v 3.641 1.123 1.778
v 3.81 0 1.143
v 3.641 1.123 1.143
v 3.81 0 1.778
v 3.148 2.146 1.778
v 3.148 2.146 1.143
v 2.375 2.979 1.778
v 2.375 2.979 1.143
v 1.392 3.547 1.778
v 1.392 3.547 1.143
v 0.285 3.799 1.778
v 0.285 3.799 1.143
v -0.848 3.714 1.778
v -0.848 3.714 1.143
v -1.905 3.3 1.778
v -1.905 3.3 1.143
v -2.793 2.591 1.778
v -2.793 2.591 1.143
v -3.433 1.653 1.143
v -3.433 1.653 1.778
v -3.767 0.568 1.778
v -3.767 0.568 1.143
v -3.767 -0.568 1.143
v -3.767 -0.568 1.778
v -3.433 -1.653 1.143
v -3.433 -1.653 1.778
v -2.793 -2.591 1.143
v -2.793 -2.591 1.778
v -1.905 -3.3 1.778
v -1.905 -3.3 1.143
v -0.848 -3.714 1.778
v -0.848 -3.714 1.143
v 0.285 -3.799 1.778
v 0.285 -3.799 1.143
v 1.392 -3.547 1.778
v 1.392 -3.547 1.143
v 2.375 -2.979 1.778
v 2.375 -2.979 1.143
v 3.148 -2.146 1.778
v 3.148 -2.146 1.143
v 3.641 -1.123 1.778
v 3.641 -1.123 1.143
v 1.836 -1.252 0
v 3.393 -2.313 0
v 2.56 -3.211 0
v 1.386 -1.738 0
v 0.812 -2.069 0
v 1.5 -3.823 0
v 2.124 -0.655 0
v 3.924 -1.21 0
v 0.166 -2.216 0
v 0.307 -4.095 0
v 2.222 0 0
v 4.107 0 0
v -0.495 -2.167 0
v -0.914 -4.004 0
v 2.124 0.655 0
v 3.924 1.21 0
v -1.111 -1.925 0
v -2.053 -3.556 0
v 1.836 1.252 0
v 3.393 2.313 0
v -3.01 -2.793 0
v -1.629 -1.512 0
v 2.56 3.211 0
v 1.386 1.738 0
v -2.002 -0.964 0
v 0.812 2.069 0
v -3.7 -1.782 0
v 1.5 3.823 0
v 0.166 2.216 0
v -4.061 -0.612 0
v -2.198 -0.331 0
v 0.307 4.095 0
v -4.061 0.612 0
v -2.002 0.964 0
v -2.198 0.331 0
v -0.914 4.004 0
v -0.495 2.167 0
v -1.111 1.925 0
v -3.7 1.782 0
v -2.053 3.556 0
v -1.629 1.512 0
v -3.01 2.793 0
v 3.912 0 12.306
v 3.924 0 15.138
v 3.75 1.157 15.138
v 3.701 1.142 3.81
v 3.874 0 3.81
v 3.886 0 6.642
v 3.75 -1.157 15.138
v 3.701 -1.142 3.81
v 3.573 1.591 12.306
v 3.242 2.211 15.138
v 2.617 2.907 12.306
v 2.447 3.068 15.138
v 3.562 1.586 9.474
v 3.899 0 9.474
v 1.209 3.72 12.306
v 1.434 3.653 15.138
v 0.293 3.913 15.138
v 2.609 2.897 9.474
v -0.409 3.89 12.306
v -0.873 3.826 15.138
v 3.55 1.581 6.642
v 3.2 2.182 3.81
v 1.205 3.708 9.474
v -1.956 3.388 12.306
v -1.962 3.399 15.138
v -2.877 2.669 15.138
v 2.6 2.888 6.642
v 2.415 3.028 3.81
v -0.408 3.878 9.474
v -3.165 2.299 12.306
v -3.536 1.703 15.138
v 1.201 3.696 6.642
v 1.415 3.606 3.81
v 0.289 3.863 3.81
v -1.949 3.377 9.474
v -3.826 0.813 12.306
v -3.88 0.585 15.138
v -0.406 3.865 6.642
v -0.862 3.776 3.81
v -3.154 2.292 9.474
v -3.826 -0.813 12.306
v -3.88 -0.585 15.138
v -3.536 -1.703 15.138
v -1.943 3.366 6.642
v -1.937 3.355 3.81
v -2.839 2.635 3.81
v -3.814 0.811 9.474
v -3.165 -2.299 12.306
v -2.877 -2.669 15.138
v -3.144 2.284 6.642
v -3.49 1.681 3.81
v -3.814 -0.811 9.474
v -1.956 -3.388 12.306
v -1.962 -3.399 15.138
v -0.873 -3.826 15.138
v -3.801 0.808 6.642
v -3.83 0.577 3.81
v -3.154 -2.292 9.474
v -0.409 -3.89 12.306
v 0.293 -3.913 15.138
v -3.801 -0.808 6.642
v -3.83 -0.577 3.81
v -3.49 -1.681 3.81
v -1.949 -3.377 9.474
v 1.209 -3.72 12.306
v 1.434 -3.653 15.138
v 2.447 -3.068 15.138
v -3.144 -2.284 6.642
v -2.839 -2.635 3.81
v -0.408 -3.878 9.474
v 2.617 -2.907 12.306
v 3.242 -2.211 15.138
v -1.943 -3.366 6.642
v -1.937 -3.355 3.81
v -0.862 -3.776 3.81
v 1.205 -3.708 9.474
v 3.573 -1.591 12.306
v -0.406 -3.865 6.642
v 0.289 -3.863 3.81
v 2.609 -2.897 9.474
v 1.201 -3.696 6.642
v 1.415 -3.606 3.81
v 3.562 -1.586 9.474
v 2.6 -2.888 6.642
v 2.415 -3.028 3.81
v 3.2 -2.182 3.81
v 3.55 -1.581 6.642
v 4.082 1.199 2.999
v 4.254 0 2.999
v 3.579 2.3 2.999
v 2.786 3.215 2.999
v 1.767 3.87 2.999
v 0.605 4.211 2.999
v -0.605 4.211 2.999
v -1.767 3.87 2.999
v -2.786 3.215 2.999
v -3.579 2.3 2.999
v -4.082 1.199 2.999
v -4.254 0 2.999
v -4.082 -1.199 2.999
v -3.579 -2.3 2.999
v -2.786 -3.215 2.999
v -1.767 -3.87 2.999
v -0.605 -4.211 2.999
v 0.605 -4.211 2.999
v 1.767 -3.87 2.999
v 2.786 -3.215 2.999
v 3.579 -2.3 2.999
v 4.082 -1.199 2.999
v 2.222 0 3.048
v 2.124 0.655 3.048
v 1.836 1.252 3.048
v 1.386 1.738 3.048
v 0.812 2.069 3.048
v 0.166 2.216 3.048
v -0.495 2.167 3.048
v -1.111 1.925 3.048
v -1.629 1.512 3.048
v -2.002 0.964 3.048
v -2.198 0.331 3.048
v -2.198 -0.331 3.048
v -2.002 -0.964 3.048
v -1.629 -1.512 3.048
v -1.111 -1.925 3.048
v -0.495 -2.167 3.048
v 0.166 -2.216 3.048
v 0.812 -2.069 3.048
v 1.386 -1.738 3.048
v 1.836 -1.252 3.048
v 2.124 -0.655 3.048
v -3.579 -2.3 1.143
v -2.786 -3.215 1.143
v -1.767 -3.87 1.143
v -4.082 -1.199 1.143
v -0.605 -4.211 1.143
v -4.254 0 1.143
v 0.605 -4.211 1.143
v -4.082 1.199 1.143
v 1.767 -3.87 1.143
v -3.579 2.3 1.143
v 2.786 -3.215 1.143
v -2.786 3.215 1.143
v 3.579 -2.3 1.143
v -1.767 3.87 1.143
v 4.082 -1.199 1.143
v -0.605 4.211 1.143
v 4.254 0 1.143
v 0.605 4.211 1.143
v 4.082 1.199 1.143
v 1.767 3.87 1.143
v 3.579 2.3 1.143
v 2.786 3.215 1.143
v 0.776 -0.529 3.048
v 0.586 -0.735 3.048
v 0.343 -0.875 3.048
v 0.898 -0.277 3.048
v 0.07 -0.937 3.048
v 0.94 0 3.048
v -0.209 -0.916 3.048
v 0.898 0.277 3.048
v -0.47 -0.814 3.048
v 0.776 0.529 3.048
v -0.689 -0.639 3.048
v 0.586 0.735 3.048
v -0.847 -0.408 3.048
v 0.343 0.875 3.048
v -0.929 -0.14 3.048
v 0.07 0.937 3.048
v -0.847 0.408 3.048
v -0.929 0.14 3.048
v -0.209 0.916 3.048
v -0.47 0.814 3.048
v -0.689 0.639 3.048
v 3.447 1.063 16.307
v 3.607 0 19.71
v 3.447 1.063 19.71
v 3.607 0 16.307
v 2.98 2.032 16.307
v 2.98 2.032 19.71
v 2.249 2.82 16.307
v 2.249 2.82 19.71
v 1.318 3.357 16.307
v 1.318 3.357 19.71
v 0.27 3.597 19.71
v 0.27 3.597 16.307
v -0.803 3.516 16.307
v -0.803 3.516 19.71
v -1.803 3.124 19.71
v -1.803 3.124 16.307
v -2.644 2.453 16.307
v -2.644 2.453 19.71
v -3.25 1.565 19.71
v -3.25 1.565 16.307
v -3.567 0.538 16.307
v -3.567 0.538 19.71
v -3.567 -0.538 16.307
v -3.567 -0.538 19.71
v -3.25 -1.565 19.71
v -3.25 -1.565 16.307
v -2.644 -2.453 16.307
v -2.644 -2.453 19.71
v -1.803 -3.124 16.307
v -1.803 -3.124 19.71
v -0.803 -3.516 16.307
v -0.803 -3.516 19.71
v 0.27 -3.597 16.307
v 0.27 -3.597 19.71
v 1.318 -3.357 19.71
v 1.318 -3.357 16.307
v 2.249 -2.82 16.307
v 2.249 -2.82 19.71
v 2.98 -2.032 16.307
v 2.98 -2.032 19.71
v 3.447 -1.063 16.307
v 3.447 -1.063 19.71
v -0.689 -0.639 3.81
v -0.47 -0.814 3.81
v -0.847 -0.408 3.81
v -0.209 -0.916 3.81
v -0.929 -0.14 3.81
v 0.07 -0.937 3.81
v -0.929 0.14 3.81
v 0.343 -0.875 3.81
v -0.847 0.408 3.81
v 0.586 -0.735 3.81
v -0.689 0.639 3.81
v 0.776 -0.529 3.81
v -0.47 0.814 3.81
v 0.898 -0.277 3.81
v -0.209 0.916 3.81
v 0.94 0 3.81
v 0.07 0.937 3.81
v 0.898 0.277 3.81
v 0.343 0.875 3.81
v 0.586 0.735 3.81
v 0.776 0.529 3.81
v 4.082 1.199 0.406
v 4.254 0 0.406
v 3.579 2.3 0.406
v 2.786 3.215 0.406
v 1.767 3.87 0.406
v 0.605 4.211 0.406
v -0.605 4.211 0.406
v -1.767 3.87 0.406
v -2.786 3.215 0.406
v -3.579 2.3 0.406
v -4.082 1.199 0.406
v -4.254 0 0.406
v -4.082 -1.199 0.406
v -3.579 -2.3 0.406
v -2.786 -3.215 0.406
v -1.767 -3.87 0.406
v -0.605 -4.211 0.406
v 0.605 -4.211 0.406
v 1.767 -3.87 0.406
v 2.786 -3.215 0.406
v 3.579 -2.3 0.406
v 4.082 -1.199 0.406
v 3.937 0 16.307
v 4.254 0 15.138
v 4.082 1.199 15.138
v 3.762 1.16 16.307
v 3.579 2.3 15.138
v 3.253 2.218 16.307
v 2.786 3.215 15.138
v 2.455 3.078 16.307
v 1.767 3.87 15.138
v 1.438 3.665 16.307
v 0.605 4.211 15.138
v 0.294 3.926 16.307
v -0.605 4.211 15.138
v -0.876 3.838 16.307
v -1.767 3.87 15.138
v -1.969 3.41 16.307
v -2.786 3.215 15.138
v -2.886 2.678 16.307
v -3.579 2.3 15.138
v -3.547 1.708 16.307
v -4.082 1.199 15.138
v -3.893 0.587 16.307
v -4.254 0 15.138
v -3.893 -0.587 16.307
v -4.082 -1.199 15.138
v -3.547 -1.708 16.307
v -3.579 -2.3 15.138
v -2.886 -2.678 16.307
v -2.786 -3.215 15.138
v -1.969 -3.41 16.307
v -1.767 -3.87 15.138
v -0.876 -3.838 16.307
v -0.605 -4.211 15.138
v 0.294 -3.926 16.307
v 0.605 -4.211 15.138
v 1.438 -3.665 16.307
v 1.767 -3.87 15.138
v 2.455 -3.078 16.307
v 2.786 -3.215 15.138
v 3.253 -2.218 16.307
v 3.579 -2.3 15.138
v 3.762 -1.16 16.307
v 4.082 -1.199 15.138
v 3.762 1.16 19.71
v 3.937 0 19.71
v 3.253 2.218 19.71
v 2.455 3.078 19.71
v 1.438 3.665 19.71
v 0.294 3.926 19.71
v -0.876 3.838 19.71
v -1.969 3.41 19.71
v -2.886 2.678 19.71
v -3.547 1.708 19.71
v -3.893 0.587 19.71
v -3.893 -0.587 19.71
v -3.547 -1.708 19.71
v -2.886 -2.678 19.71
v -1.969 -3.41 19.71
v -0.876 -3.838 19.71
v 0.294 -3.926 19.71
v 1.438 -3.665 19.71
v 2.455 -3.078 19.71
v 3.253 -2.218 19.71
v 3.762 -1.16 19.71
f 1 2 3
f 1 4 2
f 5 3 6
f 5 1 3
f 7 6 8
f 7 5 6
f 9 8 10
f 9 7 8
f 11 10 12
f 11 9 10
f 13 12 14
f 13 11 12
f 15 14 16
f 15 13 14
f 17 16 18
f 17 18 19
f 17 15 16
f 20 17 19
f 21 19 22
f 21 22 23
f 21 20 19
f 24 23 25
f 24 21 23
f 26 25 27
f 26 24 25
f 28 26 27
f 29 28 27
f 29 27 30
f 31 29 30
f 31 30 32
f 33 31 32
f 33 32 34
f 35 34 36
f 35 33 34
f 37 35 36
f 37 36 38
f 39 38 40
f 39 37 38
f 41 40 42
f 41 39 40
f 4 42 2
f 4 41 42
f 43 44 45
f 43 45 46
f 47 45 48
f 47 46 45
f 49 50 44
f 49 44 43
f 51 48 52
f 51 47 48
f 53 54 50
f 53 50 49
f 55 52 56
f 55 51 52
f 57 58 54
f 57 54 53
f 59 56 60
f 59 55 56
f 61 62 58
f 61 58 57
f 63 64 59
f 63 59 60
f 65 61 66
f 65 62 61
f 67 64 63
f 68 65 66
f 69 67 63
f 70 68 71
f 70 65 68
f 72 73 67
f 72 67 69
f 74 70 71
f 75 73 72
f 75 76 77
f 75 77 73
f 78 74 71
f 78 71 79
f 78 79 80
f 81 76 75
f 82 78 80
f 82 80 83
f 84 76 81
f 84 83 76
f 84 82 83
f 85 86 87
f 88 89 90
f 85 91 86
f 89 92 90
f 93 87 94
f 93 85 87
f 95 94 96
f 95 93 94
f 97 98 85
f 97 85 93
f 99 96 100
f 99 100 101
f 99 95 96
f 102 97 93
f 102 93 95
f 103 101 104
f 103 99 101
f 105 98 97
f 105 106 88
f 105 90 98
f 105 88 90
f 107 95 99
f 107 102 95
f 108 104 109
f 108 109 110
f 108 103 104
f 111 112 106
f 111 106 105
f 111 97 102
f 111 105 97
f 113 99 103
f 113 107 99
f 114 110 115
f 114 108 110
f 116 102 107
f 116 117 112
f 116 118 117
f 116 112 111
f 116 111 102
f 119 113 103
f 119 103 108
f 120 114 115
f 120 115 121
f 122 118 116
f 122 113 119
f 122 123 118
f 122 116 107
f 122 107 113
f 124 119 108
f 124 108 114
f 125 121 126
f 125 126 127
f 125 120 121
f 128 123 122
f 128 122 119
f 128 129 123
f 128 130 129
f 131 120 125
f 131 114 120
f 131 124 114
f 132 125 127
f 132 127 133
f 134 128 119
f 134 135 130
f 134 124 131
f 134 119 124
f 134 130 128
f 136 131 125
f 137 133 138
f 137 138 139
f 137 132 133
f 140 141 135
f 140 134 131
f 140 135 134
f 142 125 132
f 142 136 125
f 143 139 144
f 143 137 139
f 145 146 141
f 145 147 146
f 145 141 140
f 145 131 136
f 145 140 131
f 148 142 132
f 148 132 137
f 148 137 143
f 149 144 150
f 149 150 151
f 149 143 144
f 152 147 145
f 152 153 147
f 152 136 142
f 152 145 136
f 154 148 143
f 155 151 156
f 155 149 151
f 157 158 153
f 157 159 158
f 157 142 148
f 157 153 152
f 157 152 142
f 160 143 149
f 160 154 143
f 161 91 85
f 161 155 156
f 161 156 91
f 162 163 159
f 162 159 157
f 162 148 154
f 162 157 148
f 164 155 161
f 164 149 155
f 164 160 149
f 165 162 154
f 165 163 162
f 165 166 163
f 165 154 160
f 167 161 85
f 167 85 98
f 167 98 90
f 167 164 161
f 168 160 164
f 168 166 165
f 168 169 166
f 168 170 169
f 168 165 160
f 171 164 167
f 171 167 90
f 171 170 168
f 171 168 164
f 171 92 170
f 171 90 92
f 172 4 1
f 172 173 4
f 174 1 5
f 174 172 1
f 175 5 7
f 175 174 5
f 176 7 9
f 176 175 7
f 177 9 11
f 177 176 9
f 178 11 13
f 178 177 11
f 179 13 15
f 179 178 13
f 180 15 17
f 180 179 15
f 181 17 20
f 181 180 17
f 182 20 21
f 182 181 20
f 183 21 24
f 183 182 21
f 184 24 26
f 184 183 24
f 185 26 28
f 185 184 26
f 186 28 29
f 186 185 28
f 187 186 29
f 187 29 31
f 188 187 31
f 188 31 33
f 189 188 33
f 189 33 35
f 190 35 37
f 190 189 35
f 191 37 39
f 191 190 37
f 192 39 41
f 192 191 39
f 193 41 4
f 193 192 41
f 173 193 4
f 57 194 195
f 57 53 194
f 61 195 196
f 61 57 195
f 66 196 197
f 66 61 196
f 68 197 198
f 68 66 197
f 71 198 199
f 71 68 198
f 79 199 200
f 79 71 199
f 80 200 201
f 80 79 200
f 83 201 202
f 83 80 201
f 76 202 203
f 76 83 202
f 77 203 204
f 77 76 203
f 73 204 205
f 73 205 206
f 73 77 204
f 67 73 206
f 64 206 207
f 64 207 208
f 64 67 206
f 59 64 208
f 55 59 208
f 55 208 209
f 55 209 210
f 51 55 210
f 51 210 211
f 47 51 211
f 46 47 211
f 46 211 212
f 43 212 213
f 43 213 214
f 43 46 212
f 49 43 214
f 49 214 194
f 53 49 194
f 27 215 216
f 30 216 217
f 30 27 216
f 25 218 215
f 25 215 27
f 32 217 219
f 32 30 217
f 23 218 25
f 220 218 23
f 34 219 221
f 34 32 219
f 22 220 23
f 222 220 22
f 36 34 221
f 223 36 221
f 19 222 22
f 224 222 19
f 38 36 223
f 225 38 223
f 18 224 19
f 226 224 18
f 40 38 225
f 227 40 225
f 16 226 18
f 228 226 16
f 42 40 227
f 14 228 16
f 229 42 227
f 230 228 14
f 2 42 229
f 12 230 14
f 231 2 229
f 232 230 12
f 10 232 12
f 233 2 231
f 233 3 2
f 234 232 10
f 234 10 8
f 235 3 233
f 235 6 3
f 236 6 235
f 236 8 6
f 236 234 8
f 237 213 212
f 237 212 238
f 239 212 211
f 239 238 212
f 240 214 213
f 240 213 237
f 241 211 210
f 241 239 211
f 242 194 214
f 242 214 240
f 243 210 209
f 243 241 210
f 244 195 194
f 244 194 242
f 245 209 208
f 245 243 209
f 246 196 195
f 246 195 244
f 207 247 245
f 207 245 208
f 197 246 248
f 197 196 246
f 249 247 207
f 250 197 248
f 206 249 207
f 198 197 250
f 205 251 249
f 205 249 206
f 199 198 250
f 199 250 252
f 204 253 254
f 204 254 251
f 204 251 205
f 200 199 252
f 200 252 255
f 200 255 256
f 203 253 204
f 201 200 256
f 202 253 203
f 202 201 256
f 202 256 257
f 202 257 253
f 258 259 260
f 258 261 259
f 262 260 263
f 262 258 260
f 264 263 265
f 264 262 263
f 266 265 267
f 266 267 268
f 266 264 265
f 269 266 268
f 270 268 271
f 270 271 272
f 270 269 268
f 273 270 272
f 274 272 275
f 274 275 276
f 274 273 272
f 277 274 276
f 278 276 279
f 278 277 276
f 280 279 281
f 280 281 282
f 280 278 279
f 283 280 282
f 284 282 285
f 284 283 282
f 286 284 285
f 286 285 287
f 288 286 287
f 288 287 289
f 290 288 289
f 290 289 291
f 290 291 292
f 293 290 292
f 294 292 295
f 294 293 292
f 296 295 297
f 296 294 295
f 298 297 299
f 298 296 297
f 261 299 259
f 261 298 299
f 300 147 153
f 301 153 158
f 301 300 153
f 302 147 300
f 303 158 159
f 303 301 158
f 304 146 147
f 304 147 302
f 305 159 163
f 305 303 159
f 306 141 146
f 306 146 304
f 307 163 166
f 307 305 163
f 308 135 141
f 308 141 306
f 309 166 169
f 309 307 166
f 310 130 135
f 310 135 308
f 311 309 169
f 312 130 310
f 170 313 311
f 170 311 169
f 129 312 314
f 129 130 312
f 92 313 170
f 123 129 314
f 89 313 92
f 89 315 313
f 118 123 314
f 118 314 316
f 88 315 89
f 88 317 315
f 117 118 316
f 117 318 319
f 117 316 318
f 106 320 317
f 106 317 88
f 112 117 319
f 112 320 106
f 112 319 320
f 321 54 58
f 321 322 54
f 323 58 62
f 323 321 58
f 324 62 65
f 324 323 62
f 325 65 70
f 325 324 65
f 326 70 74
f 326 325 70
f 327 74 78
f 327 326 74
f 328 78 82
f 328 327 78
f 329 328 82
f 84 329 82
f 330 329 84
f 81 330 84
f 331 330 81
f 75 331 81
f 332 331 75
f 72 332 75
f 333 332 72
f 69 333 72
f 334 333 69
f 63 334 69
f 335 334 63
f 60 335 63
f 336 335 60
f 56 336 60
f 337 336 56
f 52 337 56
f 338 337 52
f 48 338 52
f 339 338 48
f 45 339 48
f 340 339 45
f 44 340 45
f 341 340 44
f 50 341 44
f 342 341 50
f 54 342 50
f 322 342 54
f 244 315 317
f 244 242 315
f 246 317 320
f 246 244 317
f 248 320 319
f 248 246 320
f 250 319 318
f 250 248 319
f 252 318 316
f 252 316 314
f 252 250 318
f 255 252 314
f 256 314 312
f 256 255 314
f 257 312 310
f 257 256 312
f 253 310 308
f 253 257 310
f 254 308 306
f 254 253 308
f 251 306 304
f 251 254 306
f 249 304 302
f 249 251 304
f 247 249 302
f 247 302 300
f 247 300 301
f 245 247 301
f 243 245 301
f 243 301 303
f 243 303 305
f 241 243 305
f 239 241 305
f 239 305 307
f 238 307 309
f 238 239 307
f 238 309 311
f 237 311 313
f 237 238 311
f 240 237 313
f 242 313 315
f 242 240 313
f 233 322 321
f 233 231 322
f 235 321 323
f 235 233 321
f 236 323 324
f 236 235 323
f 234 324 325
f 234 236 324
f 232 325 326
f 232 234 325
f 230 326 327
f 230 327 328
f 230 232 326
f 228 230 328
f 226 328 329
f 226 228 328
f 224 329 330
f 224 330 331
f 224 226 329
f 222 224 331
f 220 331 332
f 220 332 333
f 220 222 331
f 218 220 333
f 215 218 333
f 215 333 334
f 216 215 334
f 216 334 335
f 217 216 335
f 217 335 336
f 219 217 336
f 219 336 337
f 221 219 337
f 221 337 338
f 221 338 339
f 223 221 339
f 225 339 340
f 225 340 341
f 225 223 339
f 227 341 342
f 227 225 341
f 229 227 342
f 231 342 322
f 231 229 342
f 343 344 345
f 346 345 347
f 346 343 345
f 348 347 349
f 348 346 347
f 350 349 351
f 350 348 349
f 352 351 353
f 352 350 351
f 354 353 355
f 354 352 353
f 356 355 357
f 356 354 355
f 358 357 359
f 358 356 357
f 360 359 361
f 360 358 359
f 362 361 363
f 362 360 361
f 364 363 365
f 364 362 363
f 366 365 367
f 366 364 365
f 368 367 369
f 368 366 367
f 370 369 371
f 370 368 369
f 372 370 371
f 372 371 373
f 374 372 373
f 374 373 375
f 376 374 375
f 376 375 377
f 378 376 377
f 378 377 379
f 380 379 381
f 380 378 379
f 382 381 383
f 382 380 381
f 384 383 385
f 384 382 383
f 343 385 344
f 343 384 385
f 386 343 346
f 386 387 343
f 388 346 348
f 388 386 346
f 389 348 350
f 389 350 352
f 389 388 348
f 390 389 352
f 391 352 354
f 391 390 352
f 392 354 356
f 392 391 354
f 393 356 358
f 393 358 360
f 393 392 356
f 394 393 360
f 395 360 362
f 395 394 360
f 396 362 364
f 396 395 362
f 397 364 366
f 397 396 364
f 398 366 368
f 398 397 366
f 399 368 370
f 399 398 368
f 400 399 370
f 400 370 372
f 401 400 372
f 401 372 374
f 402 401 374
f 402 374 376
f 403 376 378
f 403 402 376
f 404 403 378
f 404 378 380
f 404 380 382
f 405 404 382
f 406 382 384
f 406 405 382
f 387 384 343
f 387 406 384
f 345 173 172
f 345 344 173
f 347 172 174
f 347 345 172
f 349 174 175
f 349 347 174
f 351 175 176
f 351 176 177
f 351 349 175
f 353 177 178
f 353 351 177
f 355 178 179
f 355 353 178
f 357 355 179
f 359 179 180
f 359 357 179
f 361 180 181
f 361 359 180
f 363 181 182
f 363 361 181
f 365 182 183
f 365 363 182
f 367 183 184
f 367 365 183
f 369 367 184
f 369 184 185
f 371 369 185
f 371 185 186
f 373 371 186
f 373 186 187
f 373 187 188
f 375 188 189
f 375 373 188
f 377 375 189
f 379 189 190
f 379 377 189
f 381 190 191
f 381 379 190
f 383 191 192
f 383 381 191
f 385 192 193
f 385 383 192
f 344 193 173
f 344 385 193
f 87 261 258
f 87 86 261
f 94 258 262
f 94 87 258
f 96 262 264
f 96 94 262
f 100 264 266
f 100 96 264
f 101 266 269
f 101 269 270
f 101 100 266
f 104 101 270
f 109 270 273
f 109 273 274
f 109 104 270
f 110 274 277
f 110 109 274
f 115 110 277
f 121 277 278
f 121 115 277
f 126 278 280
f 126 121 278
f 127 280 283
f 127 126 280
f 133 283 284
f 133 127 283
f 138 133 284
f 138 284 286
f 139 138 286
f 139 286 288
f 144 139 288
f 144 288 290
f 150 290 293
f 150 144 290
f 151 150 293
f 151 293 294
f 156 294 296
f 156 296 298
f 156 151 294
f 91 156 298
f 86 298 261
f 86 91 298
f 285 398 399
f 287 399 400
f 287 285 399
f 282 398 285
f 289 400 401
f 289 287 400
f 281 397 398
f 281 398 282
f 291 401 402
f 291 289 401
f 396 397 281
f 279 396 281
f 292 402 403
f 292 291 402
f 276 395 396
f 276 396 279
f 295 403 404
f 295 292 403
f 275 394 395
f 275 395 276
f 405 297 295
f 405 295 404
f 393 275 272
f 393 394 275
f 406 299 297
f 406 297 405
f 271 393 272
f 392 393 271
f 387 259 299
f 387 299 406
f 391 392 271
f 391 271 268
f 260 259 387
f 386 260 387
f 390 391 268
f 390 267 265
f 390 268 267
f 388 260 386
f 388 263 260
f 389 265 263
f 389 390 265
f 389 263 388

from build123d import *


with BuildPart() as f1:
    # F0 (on Front) → F1 (revolve)
    with BuildSketch(Plane.XZ):
        Polygon((2.2225, 3.048), (2.2225, 0), (4.106582, 0), (4.2545, 0.4064), (4.2545, 1.143), (3.81, 1.143), (3.81, 1.778), (4.2545, 2.999254), (4.2545, 15.1384), (3.937, 16.3068), (3.937, 19.7104), (3.6068, 19.7104), (3.6068, 16.3068), (3.9243, 15.1384), (3.8735, 3.81), (0.9398, 3.81), (0.9398, 3.048), align=None)
    revolve(axis=Axis((0, 0, 11.499301), (0, 0, 1)))


with BuildPart() as f2_1:
    # F2: copy of F1
    add(f1.part)


solid = f1.part
